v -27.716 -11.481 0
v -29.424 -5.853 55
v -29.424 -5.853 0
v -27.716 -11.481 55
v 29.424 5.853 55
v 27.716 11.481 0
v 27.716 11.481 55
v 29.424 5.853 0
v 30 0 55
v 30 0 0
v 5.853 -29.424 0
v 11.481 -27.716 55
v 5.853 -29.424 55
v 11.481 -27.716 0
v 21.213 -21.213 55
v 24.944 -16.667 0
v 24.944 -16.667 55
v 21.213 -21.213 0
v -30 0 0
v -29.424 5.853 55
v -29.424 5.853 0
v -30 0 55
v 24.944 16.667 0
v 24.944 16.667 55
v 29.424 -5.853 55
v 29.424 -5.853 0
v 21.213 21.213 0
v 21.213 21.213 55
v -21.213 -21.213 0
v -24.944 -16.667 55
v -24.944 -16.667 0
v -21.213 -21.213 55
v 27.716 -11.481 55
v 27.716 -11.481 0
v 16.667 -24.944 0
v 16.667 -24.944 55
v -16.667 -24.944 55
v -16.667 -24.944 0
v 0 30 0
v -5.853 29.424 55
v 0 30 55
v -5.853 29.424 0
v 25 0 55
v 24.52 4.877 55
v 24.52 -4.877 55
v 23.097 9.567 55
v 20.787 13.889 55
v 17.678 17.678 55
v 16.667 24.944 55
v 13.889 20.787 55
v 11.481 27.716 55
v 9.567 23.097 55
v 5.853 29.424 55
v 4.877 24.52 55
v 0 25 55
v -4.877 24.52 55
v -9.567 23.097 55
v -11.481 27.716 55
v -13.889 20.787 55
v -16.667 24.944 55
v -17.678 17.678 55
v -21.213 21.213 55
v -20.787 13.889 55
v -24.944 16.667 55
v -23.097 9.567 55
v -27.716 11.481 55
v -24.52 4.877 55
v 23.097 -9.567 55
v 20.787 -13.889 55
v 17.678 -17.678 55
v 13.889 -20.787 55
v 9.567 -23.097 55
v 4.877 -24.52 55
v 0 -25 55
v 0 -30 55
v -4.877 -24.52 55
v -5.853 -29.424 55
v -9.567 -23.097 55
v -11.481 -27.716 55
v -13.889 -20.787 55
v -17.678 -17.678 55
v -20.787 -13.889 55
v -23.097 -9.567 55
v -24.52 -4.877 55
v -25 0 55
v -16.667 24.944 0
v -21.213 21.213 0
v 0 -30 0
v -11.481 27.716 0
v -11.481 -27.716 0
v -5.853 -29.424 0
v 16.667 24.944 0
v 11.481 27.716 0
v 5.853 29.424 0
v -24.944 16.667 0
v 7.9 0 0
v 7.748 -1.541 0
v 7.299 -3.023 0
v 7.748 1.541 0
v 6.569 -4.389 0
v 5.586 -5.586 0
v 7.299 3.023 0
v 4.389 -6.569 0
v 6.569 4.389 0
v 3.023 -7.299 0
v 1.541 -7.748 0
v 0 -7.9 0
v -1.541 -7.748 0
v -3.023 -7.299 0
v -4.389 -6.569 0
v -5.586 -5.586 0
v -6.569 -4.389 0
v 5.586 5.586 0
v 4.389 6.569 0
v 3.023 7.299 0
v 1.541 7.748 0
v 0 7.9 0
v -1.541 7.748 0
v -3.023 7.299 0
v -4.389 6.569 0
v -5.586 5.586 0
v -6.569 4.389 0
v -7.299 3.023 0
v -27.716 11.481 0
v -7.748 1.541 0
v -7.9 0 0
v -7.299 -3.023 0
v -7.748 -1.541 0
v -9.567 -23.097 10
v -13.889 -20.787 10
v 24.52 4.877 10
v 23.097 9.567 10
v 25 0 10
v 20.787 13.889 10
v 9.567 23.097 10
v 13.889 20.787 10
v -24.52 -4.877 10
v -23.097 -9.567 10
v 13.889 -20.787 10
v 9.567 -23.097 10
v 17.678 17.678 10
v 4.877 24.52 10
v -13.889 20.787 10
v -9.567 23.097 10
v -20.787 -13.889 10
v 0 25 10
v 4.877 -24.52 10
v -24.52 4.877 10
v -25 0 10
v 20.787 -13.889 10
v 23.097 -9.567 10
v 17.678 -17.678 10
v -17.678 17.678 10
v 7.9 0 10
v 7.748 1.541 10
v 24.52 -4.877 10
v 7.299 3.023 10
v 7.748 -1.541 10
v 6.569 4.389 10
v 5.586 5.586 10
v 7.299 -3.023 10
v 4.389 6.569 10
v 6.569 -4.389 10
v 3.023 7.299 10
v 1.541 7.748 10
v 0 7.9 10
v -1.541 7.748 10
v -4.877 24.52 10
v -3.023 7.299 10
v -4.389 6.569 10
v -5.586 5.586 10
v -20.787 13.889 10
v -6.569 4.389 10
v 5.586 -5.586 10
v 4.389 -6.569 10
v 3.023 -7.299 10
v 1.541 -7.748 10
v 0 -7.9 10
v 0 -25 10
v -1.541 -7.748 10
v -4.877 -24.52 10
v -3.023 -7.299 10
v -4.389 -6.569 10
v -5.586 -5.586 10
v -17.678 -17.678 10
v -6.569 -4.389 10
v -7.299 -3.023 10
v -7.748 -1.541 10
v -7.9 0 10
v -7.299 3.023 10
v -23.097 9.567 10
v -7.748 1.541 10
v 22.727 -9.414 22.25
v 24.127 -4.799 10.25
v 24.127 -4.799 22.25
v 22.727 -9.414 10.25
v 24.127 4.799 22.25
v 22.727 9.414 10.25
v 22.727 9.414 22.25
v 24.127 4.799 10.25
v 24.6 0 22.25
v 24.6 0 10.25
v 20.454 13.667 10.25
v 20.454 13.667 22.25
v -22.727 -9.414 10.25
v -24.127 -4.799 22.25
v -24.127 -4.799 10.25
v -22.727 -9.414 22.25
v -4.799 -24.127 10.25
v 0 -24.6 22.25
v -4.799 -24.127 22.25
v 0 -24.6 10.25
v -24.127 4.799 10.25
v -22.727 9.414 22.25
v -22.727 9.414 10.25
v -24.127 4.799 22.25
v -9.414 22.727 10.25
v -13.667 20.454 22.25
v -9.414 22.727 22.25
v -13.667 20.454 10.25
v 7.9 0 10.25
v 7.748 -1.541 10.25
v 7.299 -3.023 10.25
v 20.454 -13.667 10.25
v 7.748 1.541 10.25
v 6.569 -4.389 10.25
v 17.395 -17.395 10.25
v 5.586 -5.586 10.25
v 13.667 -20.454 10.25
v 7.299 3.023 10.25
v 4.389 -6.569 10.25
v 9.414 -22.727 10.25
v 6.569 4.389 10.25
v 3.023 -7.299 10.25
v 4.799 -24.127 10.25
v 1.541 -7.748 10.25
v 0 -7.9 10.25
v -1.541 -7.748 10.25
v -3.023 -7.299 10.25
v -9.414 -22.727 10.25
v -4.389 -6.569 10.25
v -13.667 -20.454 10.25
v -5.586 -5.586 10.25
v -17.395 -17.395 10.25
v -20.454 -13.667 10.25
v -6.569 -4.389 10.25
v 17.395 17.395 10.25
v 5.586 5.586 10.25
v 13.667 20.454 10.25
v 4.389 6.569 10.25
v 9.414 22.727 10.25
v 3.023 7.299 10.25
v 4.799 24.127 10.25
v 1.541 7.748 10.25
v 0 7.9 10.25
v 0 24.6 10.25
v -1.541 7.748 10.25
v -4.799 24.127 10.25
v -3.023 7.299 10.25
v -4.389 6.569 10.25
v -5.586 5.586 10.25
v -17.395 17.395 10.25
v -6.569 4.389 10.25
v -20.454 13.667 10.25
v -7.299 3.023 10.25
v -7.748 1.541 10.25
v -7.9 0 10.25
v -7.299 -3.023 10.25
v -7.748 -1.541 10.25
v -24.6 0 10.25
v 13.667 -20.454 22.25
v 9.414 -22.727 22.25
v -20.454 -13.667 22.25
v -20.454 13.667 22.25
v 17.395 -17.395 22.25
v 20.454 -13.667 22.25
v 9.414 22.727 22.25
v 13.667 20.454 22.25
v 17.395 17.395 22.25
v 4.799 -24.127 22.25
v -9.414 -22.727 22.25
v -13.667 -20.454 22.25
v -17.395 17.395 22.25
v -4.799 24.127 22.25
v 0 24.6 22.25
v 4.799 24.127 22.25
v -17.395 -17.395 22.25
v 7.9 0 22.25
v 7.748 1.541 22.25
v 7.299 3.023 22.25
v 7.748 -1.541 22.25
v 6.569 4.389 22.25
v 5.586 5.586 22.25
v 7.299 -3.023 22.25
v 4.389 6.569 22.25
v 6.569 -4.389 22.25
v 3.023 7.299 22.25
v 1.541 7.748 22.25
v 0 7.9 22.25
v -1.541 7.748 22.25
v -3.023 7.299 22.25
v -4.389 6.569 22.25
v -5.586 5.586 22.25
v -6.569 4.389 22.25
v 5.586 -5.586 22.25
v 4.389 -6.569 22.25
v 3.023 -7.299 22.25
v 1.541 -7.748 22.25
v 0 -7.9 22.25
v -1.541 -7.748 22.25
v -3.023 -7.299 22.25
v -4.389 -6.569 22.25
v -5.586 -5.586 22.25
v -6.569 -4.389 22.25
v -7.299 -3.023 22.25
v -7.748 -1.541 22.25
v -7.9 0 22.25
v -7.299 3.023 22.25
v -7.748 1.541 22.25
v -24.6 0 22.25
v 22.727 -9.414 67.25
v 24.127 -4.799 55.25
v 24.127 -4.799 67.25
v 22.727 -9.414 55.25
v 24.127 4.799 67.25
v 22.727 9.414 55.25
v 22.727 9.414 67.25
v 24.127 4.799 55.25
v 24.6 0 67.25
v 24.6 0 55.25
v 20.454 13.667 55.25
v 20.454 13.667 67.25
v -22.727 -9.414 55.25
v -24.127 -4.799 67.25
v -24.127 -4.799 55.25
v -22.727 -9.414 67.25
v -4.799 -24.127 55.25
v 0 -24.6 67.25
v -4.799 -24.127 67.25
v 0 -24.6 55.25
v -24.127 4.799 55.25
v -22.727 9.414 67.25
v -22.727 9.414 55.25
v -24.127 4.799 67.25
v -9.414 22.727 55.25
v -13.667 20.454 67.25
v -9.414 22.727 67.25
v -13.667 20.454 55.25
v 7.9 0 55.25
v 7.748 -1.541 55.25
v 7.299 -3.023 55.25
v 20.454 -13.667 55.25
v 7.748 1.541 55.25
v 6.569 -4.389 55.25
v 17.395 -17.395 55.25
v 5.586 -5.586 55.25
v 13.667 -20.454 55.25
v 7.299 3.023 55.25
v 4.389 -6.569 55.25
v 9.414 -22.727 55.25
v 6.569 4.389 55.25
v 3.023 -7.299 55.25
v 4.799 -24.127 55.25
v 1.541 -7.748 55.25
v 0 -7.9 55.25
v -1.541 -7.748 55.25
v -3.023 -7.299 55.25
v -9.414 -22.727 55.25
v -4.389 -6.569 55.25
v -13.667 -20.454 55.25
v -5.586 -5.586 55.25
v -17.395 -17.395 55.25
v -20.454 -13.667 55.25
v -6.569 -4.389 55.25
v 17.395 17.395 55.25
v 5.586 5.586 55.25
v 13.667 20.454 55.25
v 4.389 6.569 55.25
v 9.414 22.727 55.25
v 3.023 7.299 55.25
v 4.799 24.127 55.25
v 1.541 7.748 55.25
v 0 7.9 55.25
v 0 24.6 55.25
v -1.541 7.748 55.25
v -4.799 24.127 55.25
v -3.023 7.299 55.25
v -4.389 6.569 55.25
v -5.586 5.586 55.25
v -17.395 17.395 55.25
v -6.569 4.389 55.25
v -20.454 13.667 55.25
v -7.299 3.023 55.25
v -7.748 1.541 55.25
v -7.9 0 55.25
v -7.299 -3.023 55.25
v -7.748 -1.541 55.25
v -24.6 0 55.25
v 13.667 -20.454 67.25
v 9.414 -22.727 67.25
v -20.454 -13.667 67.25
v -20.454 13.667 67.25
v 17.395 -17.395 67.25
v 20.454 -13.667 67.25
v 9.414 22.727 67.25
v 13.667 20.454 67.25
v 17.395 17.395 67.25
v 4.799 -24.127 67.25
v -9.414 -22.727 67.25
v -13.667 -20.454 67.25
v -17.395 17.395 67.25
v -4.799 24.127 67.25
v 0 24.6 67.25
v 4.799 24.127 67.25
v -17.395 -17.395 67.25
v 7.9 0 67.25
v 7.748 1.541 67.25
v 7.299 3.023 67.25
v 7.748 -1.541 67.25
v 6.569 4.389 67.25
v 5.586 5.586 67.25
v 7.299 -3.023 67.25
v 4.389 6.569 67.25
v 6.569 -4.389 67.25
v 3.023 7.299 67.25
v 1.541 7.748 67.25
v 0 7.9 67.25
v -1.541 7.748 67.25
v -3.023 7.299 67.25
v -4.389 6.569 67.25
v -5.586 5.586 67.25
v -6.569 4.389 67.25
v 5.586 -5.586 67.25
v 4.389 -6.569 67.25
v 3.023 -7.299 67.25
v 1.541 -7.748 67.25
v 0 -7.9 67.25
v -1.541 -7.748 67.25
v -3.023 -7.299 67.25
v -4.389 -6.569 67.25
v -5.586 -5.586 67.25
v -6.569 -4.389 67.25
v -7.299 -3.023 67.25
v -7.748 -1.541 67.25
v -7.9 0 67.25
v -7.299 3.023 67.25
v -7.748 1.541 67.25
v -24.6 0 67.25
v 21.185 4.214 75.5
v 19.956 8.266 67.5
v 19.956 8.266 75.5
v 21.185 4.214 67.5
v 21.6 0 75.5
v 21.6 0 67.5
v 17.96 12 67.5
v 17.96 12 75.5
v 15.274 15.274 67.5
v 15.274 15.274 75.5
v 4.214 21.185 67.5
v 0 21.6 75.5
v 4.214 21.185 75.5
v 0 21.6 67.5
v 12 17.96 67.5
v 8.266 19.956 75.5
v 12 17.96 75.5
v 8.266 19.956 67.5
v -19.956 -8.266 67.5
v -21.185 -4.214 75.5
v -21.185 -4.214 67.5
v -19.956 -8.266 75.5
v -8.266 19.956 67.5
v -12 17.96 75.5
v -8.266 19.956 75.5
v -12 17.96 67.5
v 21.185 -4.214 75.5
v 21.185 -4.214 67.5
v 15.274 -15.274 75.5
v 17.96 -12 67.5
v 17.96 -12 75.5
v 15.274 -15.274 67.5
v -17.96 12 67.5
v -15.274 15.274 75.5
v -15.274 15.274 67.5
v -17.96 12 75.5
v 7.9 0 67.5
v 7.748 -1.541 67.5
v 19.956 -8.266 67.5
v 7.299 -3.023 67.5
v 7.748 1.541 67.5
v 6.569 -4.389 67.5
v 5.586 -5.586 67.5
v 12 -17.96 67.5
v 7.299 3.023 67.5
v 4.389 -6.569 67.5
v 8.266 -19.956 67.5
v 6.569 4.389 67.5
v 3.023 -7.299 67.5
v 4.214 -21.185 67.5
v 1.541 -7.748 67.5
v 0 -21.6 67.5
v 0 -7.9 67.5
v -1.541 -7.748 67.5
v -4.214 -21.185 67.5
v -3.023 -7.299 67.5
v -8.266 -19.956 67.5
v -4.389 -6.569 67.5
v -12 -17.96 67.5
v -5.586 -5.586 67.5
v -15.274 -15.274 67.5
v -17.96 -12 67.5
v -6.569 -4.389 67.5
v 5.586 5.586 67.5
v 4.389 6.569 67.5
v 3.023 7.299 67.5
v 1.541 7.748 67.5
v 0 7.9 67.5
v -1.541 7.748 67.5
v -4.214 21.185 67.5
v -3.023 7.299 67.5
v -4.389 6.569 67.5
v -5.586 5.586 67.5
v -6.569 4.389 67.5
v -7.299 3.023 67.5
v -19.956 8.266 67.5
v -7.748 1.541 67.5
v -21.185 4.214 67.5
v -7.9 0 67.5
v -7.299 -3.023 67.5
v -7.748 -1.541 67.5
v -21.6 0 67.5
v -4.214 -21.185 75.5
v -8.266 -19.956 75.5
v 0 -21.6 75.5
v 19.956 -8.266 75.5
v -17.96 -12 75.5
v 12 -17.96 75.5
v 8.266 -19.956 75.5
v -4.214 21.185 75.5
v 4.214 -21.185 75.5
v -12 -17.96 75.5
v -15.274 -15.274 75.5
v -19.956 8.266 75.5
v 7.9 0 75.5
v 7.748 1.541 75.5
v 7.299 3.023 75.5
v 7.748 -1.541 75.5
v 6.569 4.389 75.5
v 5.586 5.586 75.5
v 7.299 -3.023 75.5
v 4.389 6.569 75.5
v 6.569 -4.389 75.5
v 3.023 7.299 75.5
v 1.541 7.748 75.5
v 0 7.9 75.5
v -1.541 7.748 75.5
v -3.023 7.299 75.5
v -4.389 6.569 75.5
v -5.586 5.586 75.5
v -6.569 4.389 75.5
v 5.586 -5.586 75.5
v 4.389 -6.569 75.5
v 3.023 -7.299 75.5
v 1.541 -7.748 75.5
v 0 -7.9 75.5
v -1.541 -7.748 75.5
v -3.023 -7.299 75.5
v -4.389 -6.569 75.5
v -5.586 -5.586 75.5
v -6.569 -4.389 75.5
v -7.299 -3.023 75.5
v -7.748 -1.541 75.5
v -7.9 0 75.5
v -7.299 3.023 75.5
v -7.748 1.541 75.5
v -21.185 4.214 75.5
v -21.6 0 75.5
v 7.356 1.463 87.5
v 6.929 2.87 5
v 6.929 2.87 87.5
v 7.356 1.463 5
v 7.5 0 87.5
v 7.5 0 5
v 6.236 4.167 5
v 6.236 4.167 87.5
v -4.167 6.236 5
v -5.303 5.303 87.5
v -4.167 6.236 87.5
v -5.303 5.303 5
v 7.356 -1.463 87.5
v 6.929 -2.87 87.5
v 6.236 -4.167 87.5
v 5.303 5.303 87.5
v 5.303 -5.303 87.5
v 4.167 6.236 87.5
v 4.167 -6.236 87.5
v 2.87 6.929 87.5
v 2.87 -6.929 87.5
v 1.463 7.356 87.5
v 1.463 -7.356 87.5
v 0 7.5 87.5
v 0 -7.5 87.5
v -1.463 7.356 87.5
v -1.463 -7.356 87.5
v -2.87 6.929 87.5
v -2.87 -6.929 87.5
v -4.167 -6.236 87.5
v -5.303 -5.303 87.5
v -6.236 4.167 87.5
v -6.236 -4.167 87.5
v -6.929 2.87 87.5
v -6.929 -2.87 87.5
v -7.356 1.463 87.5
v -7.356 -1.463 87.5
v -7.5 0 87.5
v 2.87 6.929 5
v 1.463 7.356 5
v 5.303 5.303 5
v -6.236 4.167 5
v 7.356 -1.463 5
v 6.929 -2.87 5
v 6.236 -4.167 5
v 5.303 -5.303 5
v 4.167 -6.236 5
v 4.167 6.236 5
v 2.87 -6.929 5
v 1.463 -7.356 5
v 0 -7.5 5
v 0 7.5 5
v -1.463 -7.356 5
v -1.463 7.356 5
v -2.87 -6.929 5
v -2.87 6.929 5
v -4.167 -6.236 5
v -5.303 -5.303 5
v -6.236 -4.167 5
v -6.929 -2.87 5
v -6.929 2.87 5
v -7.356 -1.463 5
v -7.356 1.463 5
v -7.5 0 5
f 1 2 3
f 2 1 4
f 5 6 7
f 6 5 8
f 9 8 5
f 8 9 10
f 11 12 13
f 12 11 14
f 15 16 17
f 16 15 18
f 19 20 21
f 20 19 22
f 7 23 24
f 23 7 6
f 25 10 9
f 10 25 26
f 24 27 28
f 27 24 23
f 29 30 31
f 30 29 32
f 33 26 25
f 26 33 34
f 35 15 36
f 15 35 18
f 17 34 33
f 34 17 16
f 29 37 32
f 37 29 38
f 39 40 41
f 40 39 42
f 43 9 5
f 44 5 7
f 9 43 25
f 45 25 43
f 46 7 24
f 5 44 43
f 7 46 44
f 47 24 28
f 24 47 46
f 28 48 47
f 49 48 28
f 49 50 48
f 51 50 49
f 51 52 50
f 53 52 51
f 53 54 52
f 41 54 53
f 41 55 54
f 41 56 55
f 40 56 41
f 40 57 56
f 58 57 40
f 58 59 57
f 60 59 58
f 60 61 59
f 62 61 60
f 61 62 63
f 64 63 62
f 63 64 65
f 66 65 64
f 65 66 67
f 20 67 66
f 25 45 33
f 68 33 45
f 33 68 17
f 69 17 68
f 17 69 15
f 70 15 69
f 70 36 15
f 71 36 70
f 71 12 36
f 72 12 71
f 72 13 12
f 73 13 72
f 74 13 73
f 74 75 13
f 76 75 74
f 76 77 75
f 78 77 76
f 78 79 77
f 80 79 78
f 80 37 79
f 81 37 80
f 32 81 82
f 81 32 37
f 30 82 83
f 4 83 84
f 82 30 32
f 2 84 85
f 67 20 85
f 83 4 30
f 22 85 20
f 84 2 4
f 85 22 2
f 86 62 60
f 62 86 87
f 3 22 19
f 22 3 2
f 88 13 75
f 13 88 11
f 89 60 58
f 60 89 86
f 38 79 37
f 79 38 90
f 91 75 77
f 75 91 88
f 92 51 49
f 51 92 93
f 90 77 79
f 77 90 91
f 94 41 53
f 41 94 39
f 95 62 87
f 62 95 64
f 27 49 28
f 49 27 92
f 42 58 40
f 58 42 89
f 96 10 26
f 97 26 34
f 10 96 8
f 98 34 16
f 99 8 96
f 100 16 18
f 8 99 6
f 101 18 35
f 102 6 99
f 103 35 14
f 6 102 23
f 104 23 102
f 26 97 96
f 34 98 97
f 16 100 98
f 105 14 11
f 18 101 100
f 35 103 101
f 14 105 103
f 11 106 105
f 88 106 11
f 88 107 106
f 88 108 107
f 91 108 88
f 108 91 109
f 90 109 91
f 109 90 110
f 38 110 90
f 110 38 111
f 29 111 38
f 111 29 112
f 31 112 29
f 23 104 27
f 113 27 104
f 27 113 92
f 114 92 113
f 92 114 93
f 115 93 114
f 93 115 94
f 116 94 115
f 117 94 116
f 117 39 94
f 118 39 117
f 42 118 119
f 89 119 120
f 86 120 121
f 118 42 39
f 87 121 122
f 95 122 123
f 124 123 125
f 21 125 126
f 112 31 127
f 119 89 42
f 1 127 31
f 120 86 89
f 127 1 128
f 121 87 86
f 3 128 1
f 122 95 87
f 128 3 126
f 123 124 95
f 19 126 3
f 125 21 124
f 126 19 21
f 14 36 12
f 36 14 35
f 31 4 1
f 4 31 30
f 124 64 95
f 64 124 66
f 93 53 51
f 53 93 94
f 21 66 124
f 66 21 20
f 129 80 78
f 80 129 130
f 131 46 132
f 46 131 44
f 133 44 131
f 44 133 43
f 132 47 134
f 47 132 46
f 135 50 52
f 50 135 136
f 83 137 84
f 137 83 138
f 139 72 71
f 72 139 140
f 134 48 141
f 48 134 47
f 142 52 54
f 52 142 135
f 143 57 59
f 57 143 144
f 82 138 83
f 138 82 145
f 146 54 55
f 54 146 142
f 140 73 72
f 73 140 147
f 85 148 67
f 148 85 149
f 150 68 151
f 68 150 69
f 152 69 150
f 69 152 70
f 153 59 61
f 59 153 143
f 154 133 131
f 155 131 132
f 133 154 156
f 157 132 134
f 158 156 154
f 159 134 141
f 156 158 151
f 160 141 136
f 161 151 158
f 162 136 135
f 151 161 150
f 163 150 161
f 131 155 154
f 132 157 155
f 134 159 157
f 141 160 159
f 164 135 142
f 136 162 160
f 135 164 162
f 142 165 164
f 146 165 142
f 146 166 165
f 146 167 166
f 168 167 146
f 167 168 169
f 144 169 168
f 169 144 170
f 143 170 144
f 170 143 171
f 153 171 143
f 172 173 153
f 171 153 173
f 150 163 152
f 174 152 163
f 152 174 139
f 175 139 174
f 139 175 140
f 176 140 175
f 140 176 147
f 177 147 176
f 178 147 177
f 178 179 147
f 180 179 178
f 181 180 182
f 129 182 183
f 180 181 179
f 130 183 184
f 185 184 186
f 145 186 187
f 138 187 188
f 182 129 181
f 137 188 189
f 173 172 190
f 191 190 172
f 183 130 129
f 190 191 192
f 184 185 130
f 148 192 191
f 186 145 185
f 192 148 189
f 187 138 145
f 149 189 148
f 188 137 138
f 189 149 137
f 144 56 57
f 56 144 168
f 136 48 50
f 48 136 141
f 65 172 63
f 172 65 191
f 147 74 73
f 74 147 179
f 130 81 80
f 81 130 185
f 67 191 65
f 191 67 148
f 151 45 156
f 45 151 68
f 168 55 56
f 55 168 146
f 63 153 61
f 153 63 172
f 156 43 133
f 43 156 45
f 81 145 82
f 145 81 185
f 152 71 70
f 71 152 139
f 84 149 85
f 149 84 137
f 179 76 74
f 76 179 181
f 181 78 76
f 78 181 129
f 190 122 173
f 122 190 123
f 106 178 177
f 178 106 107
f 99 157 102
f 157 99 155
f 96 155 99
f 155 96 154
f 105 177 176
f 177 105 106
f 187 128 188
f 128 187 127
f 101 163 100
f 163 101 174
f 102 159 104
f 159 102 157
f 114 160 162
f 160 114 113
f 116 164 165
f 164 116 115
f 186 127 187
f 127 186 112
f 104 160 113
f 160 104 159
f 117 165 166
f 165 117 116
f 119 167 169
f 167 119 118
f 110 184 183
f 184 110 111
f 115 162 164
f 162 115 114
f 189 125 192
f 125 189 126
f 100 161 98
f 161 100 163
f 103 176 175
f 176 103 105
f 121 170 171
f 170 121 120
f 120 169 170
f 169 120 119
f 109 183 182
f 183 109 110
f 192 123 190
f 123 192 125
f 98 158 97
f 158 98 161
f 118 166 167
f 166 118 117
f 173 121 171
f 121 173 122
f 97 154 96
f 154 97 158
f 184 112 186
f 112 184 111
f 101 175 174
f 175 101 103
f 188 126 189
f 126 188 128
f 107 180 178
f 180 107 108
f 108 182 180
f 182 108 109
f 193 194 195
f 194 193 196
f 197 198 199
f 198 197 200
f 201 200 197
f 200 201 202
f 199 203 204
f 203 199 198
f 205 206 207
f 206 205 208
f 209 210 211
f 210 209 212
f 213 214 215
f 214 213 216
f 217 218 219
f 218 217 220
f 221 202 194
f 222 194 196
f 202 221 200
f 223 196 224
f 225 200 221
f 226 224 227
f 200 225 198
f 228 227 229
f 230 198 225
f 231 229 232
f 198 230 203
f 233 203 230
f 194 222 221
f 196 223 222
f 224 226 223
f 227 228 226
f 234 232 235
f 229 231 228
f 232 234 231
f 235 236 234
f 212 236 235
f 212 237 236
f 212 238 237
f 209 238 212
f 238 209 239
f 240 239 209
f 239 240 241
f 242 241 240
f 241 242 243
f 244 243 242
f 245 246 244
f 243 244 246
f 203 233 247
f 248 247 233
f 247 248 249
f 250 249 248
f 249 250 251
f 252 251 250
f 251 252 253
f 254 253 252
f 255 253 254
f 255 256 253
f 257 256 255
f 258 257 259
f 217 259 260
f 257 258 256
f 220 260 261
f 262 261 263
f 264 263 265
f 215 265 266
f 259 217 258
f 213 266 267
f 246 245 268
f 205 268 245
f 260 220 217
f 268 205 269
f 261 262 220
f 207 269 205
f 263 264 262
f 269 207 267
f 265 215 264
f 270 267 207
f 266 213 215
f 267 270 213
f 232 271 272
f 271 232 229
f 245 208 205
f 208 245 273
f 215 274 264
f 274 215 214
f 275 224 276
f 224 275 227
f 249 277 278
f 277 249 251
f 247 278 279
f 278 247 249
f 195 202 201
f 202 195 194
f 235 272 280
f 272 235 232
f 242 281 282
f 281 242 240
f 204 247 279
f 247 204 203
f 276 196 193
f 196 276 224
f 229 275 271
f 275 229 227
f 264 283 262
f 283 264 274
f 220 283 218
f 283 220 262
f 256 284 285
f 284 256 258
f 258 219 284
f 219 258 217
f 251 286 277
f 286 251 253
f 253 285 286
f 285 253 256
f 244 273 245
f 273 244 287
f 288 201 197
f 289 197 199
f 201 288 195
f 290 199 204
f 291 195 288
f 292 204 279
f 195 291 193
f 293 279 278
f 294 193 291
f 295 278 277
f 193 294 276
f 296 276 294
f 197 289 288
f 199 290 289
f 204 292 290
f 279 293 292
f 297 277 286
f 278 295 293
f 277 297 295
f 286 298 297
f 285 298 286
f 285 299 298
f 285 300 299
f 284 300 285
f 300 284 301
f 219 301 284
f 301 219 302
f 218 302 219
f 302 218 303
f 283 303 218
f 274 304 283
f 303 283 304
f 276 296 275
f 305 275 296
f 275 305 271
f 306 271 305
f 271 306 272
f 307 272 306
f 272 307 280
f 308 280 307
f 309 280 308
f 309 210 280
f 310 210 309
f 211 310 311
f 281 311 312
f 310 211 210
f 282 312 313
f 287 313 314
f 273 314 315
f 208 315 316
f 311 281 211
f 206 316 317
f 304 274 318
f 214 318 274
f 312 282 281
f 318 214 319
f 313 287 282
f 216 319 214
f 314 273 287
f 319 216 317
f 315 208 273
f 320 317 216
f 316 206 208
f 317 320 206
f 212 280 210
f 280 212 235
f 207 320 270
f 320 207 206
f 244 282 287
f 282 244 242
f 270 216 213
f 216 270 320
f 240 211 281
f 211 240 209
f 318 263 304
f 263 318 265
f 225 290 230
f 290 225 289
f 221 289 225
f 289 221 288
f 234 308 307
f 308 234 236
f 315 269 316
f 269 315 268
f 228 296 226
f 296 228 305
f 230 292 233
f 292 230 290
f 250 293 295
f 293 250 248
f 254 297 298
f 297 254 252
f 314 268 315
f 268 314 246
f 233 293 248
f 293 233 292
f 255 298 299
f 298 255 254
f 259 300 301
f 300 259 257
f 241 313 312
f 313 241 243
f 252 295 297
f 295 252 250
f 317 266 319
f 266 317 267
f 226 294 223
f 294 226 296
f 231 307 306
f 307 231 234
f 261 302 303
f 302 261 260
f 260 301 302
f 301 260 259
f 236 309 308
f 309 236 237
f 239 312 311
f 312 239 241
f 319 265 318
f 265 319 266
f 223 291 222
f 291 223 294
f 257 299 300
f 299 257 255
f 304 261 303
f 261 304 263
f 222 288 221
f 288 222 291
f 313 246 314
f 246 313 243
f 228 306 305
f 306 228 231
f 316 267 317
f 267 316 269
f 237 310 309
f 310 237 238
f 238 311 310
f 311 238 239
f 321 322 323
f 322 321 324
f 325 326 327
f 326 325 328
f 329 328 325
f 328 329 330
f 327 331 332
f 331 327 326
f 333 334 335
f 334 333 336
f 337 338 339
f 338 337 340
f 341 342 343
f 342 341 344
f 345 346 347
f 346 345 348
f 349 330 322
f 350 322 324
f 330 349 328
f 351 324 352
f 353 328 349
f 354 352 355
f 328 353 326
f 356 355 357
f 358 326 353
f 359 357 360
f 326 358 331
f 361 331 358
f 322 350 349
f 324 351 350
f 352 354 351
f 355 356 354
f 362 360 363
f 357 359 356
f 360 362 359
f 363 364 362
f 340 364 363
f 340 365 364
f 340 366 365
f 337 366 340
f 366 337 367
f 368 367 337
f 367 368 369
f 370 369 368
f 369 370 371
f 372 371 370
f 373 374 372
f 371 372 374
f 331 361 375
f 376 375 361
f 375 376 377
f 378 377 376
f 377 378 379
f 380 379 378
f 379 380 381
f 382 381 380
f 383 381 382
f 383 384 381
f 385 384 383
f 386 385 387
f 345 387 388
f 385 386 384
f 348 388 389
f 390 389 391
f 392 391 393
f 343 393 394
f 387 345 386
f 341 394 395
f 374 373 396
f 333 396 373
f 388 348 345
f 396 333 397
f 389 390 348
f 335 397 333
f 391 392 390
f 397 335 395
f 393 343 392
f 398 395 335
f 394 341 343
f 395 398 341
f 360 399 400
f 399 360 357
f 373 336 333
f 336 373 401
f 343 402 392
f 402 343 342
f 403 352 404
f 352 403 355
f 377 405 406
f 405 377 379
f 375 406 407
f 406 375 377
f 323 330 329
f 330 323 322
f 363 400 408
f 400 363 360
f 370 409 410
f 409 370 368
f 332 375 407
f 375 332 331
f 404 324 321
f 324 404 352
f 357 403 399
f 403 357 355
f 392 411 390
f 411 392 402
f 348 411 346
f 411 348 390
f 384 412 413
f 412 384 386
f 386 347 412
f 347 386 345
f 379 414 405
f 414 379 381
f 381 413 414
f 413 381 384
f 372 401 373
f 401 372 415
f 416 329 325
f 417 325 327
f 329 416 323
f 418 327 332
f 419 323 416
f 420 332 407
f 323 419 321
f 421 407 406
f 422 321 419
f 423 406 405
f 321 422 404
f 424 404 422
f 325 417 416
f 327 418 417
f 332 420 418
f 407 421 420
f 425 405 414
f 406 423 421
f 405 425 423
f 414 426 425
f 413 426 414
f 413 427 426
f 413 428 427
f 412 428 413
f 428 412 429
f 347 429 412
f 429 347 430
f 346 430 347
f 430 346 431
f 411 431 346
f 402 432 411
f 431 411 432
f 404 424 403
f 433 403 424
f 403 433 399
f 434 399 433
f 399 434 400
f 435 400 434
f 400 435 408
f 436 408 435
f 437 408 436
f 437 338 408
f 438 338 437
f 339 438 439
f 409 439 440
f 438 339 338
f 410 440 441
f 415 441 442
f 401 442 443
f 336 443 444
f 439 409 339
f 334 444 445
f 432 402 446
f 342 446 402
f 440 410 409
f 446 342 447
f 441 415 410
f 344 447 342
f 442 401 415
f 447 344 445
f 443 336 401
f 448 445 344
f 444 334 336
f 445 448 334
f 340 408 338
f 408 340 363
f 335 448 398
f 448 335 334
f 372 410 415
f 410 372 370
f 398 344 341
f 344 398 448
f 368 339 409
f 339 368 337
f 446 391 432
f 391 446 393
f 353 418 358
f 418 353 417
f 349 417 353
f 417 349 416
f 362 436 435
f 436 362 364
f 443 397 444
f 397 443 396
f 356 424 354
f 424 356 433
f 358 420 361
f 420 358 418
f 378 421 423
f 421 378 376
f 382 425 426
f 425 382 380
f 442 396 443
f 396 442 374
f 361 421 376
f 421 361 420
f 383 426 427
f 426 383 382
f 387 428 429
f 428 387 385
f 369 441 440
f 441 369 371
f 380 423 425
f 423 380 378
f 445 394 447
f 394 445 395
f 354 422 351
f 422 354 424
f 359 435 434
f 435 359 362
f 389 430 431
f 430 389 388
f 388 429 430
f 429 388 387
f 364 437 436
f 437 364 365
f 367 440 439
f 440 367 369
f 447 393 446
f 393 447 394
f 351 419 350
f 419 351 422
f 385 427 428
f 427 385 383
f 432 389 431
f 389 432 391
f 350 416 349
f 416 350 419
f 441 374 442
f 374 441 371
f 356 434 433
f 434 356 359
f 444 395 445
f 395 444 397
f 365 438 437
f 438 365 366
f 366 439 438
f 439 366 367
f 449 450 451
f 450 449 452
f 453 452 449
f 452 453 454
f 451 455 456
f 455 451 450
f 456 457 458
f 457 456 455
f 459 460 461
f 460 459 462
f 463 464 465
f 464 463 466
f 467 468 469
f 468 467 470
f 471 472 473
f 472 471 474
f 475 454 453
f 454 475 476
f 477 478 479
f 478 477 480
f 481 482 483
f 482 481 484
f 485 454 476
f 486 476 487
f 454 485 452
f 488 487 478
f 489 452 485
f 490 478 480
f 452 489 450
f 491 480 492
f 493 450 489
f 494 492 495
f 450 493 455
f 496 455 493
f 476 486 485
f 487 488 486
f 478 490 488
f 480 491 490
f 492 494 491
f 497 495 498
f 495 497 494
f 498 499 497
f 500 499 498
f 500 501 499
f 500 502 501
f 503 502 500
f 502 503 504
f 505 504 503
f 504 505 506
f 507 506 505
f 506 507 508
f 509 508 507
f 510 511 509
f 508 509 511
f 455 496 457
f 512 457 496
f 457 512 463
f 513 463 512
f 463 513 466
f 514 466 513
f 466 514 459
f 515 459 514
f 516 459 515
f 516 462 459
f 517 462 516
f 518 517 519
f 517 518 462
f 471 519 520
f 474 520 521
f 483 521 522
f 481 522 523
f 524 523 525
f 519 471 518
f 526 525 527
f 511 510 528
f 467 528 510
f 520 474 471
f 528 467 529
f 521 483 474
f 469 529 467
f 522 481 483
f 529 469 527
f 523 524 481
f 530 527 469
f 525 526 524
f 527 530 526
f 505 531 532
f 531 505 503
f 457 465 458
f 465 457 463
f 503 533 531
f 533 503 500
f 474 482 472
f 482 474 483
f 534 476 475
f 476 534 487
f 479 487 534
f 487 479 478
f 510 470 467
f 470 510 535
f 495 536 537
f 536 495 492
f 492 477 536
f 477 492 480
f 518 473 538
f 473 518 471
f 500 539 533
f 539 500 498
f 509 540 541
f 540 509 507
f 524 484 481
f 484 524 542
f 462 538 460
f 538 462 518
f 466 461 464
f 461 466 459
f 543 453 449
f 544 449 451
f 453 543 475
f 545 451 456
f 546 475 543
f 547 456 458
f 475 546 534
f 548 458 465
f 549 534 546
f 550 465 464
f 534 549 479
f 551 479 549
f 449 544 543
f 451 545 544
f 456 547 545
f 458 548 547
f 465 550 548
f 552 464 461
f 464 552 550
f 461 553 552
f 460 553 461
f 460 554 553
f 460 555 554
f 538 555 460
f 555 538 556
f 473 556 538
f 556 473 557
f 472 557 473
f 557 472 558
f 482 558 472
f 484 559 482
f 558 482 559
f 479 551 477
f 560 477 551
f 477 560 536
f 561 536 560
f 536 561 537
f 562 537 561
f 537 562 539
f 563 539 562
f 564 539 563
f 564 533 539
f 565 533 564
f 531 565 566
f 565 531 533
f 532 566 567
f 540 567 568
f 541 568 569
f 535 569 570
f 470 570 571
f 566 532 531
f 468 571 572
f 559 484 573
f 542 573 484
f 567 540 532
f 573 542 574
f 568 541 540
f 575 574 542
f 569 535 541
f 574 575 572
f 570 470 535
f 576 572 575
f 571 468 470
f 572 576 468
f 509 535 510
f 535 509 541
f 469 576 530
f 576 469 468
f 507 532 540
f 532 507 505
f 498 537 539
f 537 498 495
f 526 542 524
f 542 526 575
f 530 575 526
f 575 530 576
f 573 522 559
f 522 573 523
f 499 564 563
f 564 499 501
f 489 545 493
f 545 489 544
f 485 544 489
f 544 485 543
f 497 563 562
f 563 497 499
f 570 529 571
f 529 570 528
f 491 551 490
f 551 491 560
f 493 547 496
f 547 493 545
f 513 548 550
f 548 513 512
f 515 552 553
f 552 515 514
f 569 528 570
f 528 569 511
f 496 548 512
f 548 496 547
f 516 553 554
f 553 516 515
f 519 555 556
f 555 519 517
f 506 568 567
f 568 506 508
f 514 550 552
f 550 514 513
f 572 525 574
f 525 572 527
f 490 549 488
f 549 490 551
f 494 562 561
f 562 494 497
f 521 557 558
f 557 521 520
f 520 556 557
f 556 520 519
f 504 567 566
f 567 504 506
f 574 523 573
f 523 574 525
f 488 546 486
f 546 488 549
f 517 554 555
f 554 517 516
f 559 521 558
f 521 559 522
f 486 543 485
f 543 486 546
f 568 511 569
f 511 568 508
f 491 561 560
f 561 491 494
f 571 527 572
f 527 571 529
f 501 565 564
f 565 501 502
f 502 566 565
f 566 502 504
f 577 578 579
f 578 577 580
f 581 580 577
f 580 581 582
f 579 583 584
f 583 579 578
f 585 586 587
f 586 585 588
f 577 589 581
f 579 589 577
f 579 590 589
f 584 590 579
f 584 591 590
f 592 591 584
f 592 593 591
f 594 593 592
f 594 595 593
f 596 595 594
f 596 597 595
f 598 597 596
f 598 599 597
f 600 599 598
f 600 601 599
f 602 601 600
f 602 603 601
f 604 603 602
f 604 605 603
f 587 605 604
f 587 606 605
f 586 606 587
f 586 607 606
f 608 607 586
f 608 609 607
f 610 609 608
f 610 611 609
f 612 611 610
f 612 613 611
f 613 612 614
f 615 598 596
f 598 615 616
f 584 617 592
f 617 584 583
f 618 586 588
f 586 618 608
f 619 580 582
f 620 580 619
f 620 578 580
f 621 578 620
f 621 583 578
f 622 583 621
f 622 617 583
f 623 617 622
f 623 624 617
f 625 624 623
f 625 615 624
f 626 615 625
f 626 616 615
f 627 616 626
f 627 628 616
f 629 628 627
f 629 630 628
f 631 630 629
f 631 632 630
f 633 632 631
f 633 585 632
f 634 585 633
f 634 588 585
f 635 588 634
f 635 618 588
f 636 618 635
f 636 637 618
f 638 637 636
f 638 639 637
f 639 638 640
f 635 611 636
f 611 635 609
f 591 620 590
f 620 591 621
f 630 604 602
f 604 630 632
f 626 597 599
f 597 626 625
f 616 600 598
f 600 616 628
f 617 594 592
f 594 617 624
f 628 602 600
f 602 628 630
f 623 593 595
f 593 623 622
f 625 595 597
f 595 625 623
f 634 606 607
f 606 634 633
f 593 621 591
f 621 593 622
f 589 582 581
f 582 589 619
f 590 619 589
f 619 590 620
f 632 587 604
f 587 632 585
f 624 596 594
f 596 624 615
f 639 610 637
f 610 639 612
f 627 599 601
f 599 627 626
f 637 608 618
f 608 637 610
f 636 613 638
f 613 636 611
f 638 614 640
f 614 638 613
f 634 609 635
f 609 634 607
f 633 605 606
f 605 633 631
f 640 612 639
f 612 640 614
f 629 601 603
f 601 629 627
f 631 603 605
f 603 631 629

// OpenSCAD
$fn = 32;

// ------------------------------------------------------------------------
// Bearing housing: housing d60, two bearings and a shaft
// Every part is its own module, assembly() places them once.
// ------------------------------------------------------------------------

// --- part 1 ---
module housing() {
  difference() {
    cylinder(h = 55, d = 60);
    translate([0, 0, 10]) cylinder(h = 46, d = 50);
    translate([0, 0, -1]) cylinder(h = 12, d = 15.8);
  }
}

// --- part 2 ---
module bearing_lower() {
  difference() {
      translate([0, 0, 0]) cylinder(h = 12, d = 49.2);
      translate([0, 0, -1]) cylinder(h = 14, d = 15.8);
    }
}

// --- part 3 ---
module bearing_upper() {
  difference() {
      translate([0, 0, 0]) cylinder(h = 12, d = 49.2);
      translate([0, 0, -1]) cylinder(h = 14, d = 15.8);
    }
}

// --- part 4 ---
module spacer() {
  difference() {
      translate([0, 0, 0]) cylinder(h = 8, d = 43.2);
      translate([0, 0, -1]) cylinder(h = 10, d = 15.8);
    }
}

// --- part 5 ---
module shaft() {
  translate([0, 0, -41.25]) cylinder(h = 82.5, d = 15);
}

// --- assembly ---
module assembly() {
  translate([0, 0, 0]) rotate([0, 0, 0]) housing();
  translate([0, 0, 10.25]) rotate([0, 0, 0]) bearing_lower();
  translate([0, 0, 55.25]) rotate([0, 0, 0]) bearing_upper();
  translate([0, 0, 67.5]) rotate([0, 0, 0]) spacer();
  translate([0, 0, 46.25]) rotate([0, 0, 0]) shaft();
}

assembly();
